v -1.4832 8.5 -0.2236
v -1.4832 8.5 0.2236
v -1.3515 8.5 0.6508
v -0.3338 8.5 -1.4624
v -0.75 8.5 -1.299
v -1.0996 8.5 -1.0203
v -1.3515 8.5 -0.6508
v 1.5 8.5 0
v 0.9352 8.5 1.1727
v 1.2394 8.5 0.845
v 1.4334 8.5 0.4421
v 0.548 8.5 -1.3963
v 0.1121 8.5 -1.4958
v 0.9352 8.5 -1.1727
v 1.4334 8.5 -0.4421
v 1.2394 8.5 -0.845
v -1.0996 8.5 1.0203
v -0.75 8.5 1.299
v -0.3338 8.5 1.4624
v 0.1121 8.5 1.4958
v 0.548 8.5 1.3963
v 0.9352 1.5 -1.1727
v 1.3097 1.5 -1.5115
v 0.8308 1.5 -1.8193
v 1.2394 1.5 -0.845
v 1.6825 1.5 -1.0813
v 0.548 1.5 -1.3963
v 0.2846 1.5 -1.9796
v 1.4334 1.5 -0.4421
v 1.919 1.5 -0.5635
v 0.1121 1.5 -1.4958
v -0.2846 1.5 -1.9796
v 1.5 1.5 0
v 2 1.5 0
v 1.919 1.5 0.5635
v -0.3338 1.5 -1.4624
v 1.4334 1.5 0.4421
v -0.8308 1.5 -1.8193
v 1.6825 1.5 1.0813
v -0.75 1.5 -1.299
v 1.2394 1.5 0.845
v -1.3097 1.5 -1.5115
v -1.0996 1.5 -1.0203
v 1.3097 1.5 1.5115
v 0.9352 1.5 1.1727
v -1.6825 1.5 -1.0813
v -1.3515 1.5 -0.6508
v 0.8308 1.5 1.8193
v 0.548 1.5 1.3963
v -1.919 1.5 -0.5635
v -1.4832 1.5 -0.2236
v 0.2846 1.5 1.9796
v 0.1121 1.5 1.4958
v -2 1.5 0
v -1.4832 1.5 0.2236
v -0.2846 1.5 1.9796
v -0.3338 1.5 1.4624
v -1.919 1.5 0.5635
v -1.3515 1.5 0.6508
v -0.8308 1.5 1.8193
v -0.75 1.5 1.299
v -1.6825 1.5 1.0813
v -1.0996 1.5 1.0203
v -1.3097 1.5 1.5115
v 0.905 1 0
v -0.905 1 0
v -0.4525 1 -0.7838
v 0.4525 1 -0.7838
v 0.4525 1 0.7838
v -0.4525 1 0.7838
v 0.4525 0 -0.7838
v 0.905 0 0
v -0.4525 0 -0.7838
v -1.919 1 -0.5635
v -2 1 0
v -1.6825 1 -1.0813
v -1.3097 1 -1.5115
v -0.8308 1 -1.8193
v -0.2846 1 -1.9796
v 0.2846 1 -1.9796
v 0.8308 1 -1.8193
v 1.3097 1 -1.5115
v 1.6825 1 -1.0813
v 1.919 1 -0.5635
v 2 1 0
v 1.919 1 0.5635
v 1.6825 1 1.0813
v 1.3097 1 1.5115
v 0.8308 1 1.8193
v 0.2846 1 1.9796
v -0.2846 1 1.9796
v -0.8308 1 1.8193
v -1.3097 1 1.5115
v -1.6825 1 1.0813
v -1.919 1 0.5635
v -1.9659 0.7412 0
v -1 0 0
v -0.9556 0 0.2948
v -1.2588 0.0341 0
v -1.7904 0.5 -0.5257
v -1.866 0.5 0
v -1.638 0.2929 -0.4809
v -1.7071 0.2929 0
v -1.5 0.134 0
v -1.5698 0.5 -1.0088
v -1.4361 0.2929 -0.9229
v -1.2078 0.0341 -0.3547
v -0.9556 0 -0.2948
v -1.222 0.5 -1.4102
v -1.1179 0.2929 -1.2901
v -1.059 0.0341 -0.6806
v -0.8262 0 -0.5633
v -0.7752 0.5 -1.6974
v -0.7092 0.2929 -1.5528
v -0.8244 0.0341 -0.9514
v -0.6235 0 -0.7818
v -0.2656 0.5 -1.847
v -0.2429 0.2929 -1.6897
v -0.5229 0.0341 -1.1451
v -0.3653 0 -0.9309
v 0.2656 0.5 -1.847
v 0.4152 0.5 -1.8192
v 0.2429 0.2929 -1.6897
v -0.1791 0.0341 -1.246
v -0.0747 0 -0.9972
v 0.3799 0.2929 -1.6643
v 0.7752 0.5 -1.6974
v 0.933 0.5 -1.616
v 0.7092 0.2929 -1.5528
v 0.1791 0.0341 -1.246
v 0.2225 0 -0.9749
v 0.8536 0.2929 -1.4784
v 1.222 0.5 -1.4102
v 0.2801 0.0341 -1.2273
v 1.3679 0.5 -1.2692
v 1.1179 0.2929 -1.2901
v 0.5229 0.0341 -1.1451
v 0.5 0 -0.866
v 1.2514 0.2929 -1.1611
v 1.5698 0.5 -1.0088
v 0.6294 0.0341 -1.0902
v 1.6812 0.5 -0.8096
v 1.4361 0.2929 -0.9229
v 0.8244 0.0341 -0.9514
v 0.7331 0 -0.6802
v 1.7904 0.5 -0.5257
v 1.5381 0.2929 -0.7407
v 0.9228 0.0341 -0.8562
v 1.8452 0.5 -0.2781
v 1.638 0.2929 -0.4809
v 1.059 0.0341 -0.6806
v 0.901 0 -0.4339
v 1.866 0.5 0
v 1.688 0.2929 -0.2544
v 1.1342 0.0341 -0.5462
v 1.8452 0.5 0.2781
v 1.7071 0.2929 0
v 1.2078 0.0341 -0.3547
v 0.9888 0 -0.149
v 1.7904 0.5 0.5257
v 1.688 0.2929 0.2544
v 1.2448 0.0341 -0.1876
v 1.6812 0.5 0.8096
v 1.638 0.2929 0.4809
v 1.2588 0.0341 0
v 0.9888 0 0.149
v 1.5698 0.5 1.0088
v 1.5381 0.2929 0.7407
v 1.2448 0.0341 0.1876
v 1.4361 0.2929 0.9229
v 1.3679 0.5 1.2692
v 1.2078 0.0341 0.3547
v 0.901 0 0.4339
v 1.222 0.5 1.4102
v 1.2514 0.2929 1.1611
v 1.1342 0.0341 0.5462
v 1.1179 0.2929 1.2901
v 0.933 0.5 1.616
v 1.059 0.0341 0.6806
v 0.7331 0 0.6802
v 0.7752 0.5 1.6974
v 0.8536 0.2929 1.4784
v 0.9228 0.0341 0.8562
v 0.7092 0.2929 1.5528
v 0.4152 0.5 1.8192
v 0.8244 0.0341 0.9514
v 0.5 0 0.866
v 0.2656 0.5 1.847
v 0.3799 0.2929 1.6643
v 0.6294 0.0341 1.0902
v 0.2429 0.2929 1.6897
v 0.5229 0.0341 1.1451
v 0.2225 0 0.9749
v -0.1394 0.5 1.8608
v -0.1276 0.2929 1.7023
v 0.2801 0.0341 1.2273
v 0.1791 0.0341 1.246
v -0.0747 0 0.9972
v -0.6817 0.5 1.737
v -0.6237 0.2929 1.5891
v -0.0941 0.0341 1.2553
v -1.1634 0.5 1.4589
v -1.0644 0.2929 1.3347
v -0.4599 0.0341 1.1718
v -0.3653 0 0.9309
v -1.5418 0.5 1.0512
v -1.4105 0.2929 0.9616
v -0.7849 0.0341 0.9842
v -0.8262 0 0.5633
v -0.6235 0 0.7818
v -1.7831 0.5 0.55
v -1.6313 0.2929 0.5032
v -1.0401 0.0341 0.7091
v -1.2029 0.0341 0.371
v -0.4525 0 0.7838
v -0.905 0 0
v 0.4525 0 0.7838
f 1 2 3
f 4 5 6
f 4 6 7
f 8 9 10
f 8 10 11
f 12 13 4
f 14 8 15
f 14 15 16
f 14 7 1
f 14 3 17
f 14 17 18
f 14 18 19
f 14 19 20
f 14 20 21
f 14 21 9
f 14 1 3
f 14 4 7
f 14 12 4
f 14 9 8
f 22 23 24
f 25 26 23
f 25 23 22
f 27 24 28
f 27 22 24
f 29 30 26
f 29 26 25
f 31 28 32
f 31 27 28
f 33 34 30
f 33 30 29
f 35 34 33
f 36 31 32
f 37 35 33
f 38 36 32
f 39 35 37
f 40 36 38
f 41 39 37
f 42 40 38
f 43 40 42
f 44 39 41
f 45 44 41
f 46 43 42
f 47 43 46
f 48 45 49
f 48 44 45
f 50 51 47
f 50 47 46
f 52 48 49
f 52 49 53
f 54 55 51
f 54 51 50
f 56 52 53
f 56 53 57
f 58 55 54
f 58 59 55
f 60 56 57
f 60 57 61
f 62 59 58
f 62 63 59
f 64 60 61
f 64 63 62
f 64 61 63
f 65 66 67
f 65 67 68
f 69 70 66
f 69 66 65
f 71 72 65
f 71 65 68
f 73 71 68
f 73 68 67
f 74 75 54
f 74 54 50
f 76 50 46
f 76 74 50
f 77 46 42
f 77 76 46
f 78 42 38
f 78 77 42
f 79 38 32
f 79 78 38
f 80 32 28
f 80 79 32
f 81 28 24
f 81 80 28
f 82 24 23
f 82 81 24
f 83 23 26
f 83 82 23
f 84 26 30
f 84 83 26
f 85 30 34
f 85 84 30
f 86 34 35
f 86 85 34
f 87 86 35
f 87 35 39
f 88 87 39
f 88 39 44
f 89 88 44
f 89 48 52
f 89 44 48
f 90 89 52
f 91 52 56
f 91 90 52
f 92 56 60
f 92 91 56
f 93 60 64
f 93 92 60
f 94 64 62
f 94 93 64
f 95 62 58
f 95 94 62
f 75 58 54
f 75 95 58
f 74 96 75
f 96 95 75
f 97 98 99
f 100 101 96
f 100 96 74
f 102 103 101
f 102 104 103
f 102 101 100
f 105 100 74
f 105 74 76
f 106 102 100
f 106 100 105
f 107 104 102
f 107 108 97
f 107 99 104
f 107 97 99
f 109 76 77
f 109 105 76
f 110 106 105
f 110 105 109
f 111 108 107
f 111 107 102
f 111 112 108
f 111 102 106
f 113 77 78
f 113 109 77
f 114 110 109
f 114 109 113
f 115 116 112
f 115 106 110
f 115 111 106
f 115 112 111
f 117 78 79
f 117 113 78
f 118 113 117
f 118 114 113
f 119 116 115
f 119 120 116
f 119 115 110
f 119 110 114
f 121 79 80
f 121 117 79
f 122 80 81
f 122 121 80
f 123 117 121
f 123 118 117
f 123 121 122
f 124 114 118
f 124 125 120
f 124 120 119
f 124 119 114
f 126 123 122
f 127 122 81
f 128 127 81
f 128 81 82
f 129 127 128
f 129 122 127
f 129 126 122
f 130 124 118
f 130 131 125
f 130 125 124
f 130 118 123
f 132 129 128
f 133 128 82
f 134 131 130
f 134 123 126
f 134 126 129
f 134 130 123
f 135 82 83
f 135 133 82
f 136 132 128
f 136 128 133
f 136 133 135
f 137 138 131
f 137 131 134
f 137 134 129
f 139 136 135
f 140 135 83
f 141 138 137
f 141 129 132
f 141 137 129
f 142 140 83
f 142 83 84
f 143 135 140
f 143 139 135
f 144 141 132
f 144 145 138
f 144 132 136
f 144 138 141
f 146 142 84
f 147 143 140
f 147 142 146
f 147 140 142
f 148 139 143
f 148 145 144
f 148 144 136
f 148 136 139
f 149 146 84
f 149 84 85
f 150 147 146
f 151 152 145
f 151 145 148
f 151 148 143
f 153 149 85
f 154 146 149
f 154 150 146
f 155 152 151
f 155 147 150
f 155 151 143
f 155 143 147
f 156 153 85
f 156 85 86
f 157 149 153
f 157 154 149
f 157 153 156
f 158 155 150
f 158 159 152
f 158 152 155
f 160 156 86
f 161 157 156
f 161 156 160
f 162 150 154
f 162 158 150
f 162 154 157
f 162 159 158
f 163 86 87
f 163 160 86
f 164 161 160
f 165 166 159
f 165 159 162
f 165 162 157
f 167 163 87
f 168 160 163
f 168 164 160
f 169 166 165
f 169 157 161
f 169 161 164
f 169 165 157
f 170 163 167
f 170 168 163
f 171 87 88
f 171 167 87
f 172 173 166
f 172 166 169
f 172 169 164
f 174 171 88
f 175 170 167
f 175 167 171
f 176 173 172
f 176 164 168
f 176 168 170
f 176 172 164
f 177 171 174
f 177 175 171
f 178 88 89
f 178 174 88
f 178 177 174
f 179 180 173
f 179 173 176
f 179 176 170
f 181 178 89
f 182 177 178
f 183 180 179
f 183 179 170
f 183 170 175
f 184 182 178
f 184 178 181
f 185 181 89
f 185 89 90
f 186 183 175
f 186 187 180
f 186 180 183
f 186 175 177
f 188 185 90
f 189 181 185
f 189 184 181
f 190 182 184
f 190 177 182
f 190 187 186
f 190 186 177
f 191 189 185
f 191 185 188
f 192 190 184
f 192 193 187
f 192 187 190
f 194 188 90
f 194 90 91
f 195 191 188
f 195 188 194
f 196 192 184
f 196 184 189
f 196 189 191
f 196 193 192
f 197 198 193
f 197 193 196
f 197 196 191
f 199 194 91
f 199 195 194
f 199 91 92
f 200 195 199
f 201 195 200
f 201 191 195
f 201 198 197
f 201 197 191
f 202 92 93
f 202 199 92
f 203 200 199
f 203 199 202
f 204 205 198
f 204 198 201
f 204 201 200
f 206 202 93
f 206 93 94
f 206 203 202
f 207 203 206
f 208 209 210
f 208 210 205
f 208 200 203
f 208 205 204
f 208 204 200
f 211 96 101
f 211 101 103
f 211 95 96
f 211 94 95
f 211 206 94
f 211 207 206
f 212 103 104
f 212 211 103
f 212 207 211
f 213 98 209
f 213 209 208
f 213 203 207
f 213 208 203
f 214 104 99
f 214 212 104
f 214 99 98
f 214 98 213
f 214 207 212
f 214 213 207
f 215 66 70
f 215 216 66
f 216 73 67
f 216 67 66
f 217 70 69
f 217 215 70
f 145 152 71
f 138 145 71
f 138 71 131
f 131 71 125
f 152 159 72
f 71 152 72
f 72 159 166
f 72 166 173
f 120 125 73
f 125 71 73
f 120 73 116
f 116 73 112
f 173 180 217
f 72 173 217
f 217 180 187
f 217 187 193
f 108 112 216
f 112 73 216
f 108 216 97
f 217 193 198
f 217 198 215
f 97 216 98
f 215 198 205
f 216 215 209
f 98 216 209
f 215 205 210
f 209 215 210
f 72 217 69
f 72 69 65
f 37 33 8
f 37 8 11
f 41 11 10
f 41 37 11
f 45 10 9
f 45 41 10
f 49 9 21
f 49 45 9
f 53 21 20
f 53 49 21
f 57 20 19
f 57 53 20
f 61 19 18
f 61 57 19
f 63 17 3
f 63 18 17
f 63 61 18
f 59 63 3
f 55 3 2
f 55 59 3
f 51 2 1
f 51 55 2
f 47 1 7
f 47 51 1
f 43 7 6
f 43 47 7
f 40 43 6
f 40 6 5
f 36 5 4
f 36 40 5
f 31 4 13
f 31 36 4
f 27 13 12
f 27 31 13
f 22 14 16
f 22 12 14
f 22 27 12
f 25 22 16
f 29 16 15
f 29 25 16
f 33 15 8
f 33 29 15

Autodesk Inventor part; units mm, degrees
ref_plane "YZ Plane" through (0, 0, 0) normal (1, 0, 0) x (0, 1, 0)
ref_plane "XZ Plane" through (0, 0, 0) normal (0, 1, 0) x (-1, 0, 0)
ref_plane "XY Plane" through (0, 0, 0) normal (0, 0, 1) x (1, 0, 0)
sketch "Sketch1" plane through (0, 0, 0) normal (0, 1, 0) x (-1, 0, 0)
  circle A0 centre (0, 0) radius 2
  dimension "d0" = 4
extrude "Extrusion1" add sketch "Sketch1" along normal blind 1.5
sketch "Sketch2" plane through (0, 1.5, 0) normal (0, 1, 0) x (1, 0, 0)
  circle A0 centre (0, 0) radius 1.5
  dimension "d3" = 3
extrude "Extrusion2" add sketch "Sketch2" along normal blind 7
sketch "Sketch3" plane through (0, 0, 0) normal (0, -1, 0) x (1, 0, 0)
  line L0 (0.905, 0) -> (0.4525, -0.7838)
  line L1 (0.4525, -0.7838) -> (-0.4525, -0.7838)
  line L2 (-0.4525, -0.7838) -> (-0.905, 0)
  line L3 (-0.905, 0) -> (-0.4525, 0.7838)
  line L4 (-0.4525, 0.7838) -> (0.4525, 0.7838)
  line L5 (0.4525, 0.7838) -> (0.905, 0)
  point P0 (0, 0)
  point P1 (0, 0)
extrude "Extrusion3" cut sketch "Sketch3" against normal blind 1
fillet "Fillet1" radius 1 1 edges at (2, 0, 0)
thread "Thread1" size "M3x0.35" class "6g" standard "ANSI Metric M Profile" full length
properties part number "M3x13"
